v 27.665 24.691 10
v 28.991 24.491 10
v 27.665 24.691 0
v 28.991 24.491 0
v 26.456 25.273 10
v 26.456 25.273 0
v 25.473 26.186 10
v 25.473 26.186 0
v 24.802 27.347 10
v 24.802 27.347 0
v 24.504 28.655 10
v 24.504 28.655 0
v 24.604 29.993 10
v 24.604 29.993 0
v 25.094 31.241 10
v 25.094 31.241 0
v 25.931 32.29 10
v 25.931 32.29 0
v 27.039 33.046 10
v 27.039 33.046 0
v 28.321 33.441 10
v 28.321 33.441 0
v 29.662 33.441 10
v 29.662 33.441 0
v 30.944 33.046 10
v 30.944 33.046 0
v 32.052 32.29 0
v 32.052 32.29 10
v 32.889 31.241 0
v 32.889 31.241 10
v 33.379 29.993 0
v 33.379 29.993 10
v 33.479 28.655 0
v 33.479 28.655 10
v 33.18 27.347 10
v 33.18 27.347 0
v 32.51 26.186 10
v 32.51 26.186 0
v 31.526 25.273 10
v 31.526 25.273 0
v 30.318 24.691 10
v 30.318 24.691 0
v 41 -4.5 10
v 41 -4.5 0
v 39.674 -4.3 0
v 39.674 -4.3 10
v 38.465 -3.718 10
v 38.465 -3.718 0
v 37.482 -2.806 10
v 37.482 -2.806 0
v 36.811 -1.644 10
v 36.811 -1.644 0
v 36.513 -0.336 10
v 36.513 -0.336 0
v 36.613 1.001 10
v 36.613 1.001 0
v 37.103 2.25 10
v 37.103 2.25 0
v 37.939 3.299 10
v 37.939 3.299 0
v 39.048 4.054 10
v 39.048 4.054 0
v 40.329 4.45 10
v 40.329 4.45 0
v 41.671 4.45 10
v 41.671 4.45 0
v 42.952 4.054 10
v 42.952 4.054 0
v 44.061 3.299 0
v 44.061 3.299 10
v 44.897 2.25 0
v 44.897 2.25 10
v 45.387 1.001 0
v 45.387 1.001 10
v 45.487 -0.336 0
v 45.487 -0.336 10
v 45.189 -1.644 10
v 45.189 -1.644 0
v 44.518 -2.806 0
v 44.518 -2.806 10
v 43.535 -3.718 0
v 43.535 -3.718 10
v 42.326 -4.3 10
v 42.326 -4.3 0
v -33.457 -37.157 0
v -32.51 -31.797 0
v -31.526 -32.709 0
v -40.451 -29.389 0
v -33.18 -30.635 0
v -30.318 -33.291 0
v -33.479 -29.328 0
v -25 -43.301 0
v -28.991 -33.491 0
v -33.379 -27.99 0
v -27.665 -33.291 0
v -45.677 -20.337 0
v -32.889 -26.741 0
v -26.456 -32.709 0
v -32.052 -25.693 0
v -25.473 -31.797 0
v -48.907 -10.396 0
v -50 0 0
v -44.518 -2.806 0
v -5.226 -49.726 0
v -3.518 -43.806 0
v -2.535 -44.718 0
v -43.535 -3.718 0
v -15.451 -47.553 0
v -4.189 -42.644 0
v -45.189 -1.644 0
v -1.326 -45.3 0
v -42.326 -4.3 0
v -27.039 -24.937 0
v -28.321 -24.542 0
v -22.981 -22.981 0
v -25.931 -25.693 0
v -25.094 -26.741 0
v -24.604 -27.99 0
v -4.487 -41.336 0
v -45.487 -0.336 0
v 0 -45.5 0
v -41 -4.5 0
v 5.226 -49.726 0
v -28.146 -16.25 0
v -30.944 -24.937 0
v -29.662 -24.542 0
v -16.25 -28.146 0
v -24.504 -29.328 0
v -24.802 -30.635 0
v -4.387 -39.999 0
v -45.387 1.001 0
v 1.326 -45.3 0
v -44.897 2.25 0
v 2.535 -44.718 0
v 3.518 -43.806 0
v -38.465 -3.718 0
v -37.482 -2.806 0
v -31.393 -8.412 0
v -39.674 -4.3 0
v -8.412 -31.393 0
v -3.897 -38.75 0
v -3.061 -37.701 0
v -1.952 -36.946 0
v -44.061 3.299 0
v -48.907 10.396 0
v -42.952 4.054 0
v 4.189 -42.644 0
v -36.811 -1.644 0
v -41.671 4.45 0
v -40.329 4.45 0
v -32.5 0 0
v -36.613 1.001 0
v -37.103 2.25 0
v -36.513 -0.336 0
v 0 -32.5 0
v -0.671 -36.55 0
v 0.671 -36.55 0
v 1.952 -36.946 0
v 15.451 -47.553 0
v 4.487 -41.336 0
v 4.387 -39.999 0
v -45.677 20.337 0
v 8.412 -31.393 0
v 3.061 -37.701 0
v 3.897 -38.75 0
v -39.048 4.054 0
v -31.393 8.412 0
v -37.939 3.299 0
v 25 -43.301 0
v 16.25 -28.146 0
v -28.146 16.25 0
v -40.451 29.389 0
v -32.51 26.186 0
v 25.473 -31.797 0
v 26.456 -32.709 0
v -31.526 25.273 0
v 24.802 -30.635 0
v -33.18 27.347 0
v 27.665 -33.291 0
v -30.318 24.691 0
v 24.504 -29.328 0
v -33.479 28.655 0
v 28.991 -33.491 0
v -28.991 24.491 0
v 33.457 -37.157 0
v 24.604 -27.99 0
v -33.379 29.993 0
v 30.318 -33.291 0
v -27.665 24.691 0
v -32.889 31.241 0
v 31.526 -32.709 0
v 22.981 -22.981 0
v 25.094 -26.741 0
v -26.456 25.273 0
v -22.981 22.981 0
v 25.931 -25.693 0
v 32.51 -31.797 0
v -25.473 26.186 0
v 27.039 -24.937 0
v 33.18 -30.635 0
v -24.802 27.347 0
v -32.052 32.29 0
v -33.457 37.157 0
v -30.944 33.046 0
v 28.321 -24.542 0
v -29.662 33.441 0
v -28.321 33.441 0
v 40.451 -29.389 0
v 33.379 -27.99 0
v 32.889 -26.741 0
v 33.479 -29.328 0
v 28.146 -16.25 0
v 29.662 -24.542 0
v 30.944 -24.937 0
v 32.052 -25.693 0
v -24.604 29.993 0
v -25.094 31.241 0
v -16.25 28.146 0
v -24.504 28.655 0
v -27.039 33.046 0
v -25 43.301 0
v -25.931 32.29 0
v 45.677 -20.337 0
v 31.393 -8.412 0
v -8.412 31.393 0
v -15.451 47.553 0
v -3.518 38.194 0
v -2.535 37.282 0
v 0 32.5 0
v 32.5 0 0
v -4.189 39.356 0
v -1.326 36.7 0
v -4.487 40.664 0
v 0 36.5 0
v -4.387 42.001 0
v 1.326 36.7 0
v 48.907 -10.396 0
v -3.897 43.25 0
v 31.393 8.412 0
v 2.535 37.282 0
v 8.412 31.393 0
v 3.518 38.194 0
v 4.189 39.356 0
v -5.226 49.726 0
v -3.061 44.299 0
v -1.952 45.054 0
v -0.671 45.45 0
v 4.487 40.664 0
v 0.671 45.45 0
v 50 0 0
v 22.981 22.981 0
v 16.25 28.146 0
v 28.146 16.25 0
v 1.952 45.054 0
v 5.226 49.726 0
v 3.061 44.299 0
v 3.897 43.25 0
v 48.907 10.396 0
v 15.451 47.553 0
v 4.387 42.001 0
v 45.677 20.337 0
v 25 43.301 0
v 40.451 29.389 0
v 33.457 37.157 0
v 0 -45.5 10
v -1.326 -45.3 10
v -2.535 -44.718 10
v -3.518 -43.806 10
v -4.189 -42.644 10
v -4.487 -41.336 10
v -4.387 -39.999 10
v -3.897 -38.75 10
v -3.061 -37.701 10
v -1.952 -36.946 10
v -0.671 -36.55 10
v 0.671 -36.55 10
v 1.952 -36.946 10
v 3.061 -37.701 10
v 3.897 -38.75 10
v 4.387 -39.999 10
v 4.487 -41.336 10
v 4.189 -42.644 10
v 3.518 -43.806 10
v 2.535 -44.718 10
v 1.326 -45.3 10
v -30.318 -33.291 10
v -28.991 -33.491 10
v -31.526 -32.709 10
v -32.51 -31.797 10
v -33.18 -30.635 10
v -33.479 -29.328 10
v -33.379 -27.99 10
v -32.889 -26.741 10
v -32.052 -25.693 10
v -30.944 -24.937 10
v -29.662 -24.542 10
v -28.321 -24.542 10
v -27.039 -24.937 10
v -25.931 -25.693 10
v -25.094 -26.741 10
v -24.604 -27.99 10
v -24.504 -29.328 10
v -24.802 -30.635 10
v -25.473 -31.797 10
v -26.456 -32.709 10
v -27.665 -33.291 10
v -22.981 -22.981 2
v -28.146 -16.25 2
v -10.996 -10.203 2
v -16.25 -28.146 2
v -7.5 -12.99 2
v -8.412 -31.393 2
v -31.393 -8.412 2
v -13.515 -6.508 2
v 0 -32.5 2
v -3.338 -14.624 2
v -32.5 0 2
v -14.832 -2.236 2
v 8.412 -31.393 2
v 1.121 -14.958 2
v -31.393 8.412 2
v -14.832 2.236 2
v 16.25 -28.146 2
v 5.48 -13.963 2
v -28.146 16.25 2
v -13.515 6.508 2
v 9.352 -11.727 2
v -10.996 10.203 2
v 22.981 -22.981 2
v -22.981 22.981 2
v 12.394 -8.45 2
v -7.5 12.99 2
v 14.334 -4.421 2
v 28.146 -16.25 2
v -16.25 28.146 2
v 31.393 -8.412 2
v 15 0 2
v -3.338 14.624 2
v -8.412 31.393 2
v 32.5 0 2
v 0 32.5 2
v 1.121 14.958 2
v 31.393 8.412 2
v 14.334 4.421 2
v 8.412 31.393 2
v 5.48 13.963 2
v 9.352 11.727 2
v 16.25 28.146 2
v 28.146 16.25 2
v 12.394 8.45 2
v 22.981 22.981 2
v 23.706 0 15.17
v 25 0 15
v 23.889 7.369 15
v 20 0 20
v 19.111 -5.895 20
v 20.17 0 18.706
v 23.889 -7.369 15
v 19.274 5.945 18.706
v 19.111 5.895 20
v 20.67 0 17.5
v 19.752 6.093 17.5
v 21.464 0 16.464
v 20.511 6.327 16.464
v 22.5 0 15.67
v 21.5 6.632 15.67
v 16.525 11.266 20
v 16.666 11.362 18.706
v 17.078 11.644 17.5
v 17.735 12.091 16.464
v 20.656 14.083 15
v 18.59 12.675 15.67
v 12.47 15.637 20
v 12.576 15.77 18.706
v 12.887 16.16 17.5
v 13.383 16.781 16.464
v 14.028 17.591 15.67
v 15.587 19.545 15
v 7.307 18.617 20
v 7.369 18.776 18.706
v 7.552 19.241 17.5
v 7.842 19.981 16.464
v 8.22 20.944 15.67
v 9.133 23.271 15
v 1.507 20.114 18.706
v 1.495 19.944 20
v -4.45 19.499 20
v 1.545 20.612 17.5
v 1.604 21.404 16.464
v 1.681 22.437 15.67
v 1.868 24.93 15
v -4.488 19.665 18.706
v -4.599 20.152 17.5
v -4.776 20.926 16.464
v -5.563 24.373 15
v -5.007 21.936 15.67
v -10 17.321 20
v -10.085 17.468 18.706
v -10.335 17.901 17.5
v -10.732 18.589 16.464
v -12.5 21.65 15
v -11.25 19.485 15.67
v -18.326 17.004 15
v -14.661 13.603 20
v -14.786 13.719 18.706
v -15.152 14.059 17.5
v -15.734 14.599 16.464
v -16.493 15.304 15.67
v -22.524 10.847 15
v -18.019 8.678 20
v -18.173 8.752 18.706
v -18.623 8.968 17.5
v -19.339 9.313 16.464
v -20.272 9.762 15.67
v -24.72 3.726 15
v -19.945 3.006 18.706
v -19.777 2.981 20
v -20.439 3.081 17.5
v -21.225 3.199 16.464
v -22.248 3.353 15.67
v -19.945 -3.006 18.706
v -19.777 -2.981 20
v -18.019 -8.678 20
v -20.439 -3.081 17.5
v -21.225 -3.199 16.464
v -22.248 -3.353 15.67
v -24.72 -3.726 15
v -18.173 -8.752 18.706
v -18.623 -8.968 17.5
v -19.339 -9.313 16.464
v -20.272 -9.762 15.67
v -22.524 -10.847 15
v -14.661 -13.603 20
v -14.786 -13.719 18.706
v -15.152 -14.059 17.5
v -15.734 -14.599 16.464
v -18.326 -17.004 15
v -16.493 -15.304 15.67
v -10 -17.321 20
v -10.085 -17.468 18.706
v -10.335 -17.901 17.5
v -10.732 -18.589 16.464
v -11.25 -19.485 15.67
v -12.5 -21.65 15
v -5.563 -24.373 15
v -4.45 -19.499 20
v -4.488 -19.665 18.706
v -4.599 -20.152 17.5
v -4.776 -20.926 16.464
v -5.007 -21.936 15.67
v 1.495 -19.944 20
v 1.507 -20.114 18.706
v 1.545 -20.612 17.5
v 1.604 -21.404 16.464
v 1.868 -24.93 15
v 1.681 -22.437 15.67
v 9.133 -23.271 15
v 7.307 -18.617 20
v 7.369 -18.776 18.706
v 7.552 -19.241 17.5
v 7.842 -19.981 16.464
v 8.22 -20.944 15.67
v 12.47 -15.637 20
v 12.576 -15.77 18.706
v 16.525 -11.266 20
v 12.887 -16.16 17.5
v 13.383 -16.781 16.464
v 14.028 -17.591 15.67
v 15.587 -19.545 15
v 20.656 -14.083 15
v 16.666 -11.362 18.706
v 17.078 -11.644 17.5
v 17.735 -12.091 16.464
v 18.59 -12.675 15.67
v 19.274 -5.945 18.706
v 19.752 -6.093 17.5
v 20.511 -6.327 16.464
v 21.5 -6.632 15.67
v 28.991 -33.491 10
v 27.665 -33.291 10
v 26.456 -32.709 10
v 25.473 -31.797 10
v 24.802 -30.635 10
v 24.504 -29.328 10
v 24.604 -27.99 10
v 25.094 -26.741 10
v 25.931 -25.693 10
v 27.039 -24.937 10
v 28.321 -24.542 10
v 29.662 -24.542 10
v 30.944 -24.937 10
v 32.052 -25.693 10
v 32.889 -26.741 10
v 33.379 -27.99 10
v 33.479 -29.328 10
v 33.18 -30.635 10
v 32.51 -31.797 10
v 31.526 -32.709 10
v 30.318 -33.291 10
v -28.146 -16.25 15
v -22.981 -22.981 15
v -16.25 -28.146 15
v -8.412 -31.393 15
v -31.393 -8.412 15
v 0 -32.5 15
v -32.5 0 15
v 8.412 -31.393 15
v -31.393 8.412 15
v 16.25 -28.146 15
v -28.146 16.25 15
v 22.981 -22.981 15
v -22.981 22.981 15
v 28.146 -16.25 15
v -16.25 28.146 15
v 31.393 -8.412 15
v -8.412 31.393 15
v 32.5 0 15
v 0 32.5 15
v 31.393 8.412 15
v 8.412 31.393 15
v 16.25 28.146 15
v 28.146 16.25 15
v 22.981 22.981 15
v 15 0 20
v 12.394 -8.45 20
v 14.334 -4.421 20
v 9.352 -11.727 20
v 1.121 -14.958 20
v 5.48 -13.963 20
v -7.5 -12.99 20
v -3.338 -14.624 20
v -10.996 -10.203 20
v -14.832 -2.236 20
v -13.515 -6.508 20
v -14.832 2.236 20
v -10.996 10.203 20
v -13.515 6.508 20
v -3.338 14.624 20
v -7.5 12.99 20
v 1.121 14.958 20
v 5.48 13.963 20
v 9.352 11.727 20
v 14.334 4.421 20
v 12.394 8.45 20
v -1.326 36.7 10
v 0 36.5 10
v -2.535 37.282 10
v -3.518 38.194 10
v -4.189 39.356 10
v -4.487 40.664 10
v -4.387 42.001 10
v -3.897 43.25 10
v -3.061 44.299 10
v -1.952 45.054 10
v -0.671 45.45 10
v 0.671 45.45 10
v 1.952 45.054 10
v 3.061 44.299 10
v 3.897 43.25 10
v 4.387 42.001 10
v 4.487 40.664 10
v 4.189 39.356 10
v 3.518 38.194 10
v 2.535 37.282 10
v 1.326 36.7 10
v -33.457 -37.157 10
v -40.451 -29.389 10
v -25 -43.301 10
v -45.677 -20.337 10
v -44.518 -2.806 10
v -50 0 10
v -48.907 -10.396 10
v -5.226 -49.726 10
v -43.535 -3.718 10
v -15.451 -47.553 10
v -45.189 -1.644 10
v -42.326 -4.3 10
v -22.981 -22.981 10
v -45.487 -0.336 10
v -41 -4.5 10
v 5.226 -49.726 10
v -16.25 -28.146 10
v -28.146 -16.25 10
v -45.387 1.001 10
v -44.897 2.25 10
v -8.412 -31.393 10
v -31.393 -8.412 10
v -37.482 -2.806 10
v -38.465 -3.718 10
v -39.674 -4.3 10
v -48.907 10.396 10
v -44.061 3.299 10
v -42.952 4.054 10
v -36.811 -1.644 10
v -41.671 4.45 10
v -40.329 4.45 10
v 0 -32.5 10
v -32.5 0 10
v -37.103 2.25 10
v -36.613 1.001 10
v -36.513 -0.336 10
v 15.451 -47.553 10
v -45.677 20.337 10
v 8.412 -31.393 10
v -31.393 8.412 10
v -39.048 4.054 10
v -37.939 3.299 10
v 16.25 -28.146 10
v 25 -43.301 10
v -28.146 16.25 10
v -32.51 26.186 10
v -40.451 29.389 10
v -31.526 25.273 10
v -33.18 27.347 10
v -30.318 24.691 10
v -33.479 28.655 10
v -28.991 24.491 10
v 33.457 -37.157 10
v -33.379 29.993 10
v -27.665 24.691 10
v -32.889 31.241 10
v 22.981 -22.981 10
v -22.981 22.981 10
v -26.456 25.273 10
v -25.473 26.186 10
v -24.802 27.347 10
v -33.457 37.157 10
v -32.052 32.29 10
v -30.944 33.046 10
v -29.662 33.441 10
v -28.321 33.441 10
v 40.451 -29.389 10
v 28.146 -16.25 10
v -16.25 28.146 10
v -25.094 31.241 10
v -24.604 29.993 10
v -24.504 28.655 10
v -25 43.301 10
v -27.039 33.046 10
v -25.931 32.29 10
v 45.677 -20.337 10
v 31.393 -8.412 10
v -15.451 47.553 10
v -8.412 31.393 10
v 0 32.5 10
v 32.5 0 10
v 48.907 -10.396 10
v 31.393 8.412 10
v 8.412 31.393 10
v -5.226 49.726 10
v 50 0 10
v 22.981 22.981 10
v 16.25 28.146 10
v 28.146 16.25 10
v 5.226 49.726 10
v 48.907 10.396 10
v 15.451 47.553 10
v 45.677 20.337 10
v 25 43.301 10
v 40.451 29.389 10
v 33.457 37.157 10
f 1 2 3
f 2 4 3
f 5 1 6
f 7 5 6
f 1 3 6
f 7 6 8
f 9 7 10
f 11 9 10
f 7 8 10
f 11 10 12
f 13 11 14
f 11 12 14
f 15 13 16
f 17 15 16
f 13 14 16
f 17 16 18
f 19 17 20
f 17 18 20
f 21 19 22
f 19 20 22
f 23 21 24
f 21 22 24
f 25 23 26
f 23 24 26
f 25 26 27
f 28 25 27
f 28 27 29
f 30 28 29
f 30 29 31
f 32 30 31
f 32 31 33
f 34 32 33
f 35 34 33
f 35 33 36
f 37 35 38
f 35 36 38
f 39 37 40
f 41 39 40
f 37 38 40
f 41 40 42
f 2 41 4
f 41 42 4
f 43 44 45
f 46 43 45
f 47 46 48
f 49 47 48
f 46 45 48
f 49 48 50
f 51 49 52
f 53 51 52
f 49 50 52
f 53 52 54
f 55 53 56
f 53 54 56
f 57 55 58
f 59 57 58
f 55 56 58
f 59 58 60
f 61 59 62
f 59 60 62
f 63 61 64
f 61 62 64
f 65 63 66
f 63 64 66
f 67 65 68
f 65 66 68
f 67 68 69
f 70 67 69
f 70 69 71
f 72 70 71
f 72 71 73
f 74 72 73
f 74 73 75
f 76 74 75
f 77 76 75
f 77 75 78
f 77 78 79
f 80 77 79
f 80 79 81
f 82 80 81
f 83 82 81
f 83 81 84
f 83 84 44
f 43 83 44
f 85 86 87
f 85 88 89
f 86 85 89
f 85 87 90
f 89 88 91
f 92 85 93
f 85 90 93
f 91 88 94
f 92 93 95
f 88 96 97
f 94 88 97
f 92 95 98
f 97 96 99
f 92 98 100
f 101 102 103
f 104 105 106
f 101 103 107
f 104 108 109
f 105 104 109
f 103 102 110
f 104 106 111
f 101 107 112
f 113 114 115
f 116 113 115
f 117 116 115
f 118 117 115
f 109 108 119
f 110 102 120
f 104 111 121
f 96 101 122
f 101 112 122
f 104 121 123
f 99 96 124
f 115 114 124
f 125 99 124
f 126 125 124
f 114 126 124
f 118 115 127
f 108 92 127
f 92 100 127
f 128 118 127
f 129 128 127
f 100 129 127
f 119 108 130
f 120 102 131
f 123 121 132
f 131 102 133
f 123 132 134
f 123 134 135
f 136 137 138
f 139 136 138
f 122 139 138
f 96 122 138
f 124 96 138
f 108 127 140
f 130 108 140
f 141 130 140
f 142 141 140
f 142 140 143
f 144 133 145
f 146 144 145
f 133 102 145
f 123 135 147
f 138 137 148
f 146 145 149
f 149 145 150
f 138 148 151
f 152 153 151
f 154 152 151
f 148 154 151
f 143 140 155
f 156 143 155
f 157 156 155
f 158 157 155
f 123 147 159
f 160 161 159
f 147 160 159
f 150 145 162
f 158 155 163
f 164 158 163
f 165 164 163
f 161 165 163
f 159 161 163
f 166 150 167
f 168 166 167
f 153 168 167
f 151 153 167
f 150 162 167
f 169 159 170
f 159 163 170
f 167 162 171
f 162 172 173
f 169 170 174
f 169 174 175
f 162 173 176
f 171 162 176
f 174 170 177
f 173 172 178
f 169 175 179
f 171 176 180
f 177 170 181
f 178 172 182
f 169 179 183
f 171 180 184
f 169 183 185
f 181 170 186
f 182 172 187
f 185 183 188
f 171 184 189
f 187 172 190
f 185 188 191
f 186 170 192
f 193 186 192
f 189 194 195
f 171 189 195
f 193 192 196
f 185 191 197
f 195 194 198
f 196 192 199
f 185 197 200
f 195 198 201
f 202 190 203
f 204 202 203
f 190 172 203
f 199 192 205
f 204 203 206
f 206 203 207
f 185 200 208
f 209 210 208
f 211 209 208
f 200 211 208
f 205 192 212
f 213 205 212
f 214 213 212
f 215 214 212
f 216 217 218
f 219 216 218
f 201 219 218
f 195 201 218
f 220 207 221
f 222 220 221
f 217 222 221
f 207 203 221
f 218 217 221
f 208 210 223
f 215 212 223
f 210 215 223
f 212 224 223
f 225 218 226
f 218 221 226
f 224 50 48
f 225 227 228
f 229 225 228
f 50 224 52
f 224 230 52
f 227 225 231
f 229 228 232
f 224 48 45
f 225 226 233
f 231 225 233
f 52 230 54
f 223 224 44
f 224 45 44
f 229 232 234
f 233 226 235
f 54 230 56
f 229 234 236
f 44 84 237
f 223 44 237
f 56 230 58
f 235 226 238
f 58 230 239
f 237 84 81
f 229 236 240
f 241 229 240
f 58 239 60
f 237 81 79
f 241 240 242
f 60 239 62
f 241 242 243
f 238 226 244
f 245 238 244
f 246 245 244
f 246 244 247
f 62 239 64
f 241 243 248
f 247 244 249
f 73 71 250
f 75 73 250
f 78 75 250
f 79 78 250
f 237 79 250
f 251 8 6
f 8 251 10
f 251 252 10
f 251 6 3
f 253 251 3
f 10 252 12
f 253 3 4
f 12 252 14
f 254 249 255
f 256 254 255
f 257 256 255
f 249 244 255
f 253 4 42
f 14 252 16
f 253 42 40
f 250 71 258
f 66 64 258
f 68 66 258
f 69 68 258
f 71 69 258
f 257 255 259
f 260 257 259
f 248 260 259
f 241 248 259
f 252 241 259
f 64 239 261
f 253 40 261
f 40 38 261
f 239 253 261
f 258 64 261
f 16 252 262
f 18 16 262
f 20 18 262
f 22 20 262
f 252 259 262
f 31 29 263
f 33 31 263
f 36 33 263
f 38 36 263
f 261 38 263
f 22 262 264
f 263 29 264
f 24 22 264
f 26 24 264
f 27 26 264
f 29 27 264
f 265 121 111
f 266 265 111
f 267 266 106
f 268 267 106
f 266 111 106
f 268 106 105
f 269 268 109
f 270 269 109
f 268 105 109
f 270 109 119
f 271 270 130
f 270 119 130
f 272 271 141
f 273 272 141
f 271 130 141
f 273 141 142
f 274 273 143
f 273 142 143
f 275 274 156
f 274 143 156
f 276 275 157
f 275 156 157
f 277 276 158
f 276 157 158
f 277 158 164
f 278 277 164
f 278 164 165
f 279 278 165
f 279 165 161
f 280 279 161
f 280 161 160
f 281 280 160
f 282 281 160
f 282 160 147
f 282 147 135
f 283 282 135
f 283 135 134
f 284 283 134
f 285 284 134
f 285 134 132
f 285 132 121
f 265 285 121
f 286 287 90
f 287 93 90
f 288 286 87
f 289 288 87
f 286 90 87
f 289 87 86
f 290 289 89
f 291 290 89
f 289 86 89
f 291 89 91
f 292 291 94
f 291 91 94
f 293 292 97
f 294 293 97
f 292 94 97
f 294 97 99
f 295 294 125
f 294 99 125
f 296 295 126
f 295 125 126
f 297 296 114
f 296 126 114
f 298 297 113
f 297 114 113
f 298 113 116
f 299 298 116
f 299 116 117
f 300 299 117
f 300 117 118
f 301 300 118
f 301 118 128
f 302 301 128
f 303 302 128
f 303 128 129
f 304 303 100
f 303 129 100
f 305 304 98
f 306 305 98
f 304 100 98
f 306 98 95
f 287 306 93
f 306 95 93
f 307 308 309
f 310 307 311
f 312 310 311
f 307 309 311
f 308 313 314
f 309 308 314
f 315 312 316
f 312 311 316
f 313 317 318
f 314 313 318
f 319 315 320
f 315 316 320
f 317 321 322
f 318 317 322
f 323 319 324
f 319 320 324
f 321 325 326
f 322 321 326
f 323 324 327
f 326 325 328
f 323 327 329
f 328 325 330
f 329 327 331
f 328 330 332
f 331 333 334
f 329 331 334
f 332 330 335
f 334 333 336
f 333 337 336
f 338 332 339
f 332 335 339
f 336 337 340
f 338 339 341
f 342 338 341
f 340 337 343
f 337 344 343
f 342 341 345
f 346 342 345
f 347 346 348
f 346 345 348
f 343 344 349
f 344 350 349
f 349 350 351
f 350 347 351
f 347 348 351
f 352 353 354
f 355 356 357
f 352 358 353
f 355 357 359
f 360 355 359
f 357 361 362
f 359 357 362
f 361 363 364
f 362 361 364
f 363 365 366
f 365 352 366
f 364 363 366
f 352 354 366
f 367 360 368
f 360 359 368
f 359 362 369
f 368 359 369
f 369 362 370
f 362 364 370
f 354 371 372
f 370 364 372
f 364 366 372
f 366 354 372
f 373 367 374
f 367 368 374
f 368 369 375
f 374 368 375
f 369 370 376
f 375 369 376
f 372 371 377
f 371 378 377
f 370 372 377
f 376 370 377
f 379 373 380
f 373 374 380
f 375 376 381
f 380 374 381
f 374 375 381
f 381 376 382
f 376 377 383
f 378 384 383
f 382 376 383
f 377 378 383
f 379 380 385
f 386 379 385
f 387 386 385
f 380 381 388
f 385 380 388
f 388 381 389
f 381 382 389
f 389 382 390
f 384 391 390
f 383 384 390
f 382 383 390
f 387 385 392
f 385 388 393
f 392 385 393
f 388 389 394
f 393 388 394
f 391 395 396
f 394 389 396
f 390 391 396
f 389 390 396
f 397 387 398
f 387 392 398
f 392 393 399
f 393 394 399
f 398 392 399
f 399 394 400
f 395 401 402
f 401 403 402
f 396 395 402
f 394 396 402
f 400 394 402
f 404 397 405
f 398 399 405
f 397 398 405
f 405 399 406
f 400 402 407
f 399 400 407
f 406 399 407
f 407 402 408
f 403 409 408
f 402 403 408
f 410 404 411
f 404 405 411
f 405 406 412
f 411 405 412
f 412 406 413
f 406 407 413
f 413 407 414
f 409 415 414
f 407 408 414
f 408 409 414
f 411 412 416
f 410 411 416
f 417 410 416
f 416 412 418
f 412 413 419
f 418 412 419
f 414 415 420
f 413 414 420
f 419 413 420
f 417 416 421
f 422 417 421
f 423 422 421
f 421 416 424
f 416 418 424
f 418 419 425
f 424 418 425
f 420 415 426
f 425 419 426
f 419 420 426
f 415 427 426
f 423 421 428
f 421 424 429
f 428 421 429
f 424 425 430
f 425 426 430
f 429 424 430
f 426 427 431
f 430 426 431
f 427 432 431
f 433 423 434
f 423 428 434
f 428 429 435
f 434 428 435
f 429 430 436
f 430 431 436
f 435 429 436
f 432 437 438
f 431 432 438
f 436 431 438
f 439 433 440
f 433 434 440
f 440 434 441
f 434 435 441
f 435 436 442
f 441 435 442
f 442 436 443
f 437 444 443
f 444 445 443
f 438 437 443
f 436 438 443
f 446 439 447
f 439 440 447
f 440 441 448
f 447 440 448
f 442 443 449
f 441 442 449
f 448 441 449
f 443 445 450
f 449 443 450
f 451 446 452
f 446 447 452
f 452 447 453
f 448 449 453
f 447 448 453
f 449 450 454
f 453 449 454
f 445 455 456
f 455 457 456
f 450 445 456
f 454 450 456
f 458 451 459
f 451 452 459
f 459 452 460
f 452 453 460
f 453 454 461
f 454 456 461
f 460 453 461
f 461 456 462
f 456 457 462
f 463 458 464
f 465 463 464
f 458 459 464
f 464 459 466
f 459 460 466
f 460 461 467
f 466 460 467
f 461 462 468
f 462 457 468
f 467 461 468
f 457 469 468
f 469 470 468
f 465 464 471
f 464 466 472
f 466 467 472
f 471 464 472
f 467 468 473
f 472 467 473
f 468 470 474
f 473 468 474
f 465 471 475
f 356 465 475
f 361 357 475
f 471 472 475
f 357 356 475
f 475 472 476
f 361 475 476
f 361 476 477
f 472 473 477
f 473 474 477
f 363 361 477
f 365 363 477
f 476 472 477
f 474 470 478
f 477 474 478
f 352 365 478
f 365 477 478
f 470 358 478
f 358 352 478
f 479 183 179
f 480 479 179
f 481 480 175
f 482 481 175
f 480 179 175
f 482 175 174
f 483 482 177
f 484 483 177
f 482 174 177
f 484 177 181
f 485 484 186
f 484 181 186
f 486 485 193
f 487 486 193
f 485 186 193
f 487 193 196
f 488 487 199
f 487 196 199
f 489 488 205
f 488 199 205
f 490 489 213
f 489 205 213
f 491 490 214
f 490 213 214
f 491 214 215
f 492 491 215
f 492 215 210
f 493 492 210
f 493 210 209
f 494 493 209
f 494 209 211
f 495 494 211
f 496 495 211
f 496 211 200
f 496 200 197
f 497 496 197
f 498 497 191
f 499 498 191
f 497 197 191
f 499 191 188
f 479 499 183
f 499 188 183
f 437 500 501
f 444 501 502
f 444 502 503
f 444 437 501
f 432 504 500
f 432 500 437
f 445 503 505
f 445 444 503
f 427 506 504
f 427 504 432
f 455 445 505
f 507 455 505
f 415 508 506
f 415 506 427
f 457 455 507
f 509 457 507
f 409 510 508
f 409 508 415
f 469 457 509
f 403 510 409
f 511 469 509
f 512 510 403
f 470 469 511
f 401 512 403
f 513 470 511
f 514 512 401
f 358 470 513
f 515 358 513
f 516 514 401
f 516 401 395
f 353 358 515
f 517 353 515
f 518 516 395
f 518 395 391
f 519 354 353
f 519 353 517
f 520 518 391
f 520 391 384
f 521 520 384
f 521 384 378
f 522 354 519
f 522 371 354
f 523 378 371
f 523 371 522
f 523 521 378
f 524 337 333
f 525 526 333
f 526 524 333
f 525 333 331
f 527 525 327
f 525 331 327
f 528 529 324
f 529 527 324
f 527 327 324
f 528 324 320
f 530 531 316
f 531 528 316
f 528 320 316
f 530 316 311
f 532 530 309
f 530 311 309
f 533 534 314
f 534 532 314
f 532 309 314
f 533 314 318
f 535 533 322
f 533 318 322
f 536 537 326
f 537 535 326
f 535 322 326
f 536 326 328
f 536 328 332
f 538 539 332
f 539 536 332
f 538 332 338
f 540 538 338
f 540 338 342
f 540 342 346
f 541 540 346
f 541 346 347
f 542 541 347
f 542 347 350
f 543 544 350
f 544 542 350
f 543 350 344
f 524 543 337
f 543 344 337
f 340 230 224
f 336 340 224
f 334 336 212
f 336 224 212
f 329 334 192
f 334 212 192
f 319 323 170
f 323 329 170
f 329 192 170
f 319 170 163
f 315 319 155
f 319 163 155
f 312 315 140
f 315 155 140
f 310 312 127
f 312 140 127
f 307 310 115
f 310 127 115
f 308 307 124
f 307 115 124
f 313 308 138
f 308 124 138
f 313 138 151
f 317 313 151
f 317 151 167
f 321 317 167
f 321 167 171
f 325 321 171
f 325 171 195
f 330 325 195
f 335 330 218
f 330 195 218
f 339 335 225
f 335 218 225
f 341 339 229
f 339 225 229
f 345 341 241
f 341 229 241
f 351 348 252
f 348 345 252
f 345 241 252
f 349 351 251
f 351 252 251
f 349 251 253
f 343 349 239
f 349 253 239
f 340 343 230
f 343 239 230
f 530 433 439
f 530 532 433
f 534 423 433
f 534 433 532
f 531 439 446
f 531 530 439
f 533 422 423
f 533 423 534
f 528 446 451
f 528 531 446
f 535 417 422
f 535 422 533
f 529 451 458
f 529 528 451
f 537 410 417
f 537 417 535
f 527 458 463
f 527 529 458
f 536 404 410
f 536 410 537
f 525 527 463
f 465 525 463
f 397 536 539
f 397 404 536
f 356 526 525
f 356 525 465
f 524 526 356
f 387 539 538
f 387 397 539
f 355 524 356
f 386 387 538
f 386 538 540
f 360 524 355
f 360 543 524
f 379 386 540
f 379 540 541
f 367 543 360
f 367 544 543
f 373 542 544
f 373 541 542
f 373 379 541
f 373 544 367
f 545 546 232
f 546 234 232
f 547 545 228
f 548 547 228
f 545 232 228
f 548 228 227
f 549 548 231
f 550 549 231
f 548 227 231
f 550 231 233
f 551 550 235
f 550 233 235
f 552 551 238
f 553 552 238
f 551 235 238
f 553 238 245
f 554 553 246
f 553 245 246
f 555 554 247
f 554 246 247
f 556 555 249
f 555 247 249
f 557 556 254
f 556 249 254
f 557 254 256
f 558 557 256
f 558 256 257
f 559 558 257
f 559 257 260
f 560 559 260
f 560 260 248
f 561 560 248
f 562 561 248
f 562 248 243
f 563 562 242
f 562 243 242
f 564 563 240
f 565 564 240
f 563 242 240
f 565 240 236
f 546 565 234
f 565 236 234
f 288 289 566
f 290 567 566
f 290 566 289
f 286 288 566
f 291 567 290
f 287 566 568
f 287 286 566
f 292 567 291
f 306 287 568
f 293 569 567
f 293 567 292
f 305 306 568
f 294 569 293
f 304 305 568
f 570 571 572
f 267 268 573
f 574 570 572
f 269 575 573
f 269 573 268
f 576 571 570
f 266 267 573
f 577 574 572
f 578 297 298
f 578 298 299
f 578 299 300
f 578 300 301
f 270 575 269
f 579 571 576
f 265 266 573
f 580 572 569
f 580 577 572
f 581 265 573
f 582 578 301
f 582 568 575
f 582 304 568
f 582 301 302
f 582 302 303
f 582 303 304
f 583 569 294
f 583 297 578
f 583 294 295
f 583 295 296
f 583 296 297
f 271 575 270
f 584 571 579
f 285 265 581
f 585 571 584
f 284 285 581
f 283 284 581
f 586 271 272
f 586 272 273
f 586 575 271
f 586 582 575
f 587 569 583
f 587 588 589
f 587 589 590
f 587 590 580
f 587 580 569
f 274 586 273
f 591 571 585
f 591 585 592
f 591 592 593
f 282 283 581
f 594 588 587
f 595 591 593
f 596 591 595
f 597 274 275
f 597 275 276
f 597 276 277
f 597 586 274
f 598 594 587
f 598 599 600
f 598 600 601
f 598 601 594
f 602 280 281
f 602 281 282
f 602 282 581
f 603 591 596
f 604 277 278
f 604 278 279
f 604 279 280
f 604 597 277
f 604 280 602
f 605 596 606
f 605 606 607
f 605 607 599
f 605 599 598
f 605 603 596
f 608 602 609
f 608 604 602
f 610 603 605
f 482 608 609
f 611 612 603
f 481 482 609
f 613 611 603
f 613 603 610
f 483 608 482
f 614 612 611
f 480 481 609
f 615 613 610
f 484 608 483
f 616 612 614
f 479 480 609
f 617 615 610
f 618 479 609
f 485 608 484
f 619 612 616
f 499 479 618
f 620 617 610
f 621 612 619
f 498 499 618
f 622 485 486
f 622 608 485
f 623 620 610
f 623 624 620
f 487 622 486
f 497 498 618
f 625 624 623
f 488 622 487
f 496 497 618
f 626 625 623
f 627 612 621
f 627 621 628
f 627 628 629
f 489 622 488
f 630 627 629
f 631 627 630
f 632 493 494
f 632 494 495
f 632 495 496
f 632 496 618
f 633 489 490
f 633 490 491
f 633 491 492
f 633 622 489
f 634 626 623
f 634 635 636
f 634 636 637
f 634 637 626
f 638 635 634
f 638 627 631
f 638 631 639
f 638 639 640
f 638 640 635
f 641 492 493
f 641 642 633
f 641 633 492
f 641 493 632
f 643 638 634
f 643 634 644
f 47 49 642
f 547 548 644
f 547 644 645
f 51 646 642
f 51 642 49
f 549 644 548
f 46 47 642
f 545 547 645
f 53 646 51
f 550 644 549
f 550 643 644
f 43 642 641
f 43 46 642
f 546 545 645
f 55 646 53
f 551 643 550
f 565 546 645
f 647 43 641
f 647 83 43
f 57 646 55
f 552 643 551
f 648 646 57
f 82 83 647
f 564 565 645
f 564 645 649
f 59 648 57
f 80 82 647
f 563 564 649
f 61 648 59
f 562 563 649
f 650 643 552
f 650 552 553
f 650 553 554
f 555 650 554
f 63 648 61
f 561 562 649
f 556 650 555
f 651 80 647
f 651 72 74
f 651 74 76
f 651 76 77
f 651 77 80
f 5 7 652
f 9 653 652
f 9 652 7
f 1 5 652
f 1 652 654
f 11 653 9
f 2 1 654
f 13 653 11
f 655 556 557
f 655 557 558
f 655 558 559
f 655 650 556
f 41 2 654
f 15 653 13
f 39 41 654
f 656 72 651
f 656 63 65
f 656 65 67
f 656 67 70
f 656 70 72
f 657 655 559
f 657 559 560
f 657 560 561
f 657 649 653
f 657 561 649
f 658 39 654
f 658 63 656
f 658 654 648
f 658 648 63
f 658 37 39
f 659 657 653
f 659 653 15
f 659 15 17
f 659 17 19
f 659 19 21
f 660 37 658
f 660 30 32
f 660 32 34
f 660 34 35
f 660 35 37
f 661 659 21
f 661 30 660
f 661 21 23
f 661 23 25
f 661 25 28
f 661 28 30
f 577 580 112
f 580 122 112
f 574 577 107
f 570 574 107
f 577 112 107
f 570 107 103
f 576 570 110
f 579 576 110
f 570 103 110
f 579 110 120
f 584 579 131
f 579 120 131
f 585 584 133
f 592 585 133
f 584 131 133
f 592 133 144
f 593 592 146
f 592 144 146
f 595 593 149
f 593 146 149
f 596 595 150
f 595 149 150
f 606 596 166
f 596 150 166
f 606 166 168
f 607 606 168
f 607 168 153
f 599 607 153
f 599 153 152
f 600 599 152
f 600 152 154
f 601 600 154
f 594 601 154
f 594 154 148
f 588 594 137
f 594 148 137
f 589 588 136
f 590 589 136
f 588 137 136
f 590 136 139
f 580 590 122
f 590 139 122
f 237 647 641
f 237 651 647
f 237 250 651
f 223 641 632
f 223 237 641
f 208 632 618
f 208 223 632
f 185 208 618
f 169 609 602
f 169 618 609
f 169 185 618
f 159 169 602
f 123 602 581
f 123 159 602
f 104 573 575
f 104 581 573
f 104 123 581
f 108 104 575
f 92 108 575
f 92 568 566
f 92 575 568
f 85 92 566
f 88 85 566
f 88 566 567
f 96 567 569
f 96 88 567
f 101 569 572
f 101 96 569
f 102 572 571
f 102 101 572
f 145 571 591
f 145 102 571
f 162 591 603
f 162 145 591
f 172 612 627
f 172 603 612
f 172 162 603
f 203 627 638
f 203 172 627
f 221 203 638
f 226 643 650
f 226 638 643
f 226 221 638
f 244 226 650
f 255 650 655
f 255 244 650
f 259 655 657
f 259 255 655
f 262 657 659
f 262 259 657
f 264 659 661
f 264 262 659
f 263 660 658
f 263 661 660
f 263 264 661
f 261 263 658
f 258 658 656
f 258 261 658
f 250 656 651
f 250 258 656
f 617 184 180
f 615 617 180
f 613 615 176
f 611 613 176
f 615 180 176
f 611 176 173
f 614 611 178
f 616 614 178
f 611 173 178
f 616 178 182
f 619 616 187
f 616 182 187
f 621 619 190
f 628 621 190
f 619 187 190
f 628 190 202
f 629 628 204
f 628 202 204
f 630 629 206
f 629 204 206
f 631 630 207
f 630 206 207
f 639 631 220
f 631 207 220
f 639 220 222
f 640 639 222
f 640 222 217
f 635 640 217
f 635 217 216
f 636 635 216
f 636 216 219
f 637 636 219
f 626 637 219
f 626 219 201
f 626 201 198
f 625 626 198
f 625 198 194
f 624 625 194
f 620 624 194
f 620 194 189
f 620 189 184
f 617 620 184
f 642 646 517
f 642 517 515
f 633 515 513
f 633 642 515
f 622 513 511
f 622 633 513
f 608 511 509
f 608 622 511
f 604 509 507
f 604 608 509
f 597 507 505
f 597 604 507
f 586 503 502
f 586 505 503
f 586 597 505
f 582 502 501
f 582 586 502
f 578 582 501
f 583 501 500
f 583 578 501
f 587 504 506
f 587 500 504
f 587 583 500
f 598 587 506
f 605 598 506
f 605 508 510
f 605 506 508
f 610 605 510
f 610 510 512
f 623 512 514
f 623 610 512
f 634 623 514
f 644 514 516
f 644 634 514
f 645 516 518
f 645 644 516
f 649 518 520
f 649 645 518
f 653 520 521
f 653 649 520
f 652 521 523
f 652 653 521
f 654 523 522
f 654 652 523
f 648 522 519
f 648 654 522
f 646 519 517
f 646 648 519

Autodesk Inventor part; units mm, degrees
ref_plane "YZ Plane" through (0, 0, 0) normal (1, 0, 0) x (0, 1, 0)
ref_plane "XZ Plane" through (0, 0, 0) normal (0, 1, 0) x (-1, 0, 0)
ref_plane "XY Plane" through (0, 0, 0) normal (0, 0, 1) x (1, 0, 0)
sketch "Sketch1" plane through (0, 0, 0) normal (0, 0, 1) x (1, 0, 0)
  circle A0 centre (0, 0) radius 15
  circle A1 centre (0, 0) radius 20
  circle A2 centre (0, 0) radius 32.5
  circle A3 centre (0, 0) radius 50
  dimension "d0" = 30
  dimension "d1" = 40
  dimension "d2" = 65
  dimension "d3" = 100
extrude "Extrusion1" add sketch "Sketch1" along normal blind 10 contours A2 | A3
extrude "Extrusion2" add sketch "Sketch1" along normal blind 20 contours A1
extrude "Extrusion3" add sketch "Sketch1" along normal blind 15 contours A2
fillet "Fillet1" radius 5 1 edges at (-20, 0, 15)
extrude "Extrusion4" cut sketch "Sketch1" along normal blind 2 contours A1 | A2
sketch "Sketch3" plane through (0, 0, 10) normal (0, 0, 1) x (1, 0, 0)
  point P0 (41, 0)
  point P1 (0, 41)
  point P2 (-28.9914, 28.9914)
  point P3 (-41, 0)
  point P4 (-28.9914, -28.9914)
  point P5 (0, -41)
  point P6 (28.9914, -28.9914)
  point P7 (28.9914, 28.9914)
hole "Hole2" at (41, 0, 10) at (0, 41, 10) at (-28.9914, 28.9914, 10) at (-41, 0, 10) at (-28.9914, -28.9914, 10) at (0, -41, 10) at (28.9914, -28.9914, 10) at (28.9914, 28.9914, 10) direction (0, 0, -1) diameter 9 end through all
